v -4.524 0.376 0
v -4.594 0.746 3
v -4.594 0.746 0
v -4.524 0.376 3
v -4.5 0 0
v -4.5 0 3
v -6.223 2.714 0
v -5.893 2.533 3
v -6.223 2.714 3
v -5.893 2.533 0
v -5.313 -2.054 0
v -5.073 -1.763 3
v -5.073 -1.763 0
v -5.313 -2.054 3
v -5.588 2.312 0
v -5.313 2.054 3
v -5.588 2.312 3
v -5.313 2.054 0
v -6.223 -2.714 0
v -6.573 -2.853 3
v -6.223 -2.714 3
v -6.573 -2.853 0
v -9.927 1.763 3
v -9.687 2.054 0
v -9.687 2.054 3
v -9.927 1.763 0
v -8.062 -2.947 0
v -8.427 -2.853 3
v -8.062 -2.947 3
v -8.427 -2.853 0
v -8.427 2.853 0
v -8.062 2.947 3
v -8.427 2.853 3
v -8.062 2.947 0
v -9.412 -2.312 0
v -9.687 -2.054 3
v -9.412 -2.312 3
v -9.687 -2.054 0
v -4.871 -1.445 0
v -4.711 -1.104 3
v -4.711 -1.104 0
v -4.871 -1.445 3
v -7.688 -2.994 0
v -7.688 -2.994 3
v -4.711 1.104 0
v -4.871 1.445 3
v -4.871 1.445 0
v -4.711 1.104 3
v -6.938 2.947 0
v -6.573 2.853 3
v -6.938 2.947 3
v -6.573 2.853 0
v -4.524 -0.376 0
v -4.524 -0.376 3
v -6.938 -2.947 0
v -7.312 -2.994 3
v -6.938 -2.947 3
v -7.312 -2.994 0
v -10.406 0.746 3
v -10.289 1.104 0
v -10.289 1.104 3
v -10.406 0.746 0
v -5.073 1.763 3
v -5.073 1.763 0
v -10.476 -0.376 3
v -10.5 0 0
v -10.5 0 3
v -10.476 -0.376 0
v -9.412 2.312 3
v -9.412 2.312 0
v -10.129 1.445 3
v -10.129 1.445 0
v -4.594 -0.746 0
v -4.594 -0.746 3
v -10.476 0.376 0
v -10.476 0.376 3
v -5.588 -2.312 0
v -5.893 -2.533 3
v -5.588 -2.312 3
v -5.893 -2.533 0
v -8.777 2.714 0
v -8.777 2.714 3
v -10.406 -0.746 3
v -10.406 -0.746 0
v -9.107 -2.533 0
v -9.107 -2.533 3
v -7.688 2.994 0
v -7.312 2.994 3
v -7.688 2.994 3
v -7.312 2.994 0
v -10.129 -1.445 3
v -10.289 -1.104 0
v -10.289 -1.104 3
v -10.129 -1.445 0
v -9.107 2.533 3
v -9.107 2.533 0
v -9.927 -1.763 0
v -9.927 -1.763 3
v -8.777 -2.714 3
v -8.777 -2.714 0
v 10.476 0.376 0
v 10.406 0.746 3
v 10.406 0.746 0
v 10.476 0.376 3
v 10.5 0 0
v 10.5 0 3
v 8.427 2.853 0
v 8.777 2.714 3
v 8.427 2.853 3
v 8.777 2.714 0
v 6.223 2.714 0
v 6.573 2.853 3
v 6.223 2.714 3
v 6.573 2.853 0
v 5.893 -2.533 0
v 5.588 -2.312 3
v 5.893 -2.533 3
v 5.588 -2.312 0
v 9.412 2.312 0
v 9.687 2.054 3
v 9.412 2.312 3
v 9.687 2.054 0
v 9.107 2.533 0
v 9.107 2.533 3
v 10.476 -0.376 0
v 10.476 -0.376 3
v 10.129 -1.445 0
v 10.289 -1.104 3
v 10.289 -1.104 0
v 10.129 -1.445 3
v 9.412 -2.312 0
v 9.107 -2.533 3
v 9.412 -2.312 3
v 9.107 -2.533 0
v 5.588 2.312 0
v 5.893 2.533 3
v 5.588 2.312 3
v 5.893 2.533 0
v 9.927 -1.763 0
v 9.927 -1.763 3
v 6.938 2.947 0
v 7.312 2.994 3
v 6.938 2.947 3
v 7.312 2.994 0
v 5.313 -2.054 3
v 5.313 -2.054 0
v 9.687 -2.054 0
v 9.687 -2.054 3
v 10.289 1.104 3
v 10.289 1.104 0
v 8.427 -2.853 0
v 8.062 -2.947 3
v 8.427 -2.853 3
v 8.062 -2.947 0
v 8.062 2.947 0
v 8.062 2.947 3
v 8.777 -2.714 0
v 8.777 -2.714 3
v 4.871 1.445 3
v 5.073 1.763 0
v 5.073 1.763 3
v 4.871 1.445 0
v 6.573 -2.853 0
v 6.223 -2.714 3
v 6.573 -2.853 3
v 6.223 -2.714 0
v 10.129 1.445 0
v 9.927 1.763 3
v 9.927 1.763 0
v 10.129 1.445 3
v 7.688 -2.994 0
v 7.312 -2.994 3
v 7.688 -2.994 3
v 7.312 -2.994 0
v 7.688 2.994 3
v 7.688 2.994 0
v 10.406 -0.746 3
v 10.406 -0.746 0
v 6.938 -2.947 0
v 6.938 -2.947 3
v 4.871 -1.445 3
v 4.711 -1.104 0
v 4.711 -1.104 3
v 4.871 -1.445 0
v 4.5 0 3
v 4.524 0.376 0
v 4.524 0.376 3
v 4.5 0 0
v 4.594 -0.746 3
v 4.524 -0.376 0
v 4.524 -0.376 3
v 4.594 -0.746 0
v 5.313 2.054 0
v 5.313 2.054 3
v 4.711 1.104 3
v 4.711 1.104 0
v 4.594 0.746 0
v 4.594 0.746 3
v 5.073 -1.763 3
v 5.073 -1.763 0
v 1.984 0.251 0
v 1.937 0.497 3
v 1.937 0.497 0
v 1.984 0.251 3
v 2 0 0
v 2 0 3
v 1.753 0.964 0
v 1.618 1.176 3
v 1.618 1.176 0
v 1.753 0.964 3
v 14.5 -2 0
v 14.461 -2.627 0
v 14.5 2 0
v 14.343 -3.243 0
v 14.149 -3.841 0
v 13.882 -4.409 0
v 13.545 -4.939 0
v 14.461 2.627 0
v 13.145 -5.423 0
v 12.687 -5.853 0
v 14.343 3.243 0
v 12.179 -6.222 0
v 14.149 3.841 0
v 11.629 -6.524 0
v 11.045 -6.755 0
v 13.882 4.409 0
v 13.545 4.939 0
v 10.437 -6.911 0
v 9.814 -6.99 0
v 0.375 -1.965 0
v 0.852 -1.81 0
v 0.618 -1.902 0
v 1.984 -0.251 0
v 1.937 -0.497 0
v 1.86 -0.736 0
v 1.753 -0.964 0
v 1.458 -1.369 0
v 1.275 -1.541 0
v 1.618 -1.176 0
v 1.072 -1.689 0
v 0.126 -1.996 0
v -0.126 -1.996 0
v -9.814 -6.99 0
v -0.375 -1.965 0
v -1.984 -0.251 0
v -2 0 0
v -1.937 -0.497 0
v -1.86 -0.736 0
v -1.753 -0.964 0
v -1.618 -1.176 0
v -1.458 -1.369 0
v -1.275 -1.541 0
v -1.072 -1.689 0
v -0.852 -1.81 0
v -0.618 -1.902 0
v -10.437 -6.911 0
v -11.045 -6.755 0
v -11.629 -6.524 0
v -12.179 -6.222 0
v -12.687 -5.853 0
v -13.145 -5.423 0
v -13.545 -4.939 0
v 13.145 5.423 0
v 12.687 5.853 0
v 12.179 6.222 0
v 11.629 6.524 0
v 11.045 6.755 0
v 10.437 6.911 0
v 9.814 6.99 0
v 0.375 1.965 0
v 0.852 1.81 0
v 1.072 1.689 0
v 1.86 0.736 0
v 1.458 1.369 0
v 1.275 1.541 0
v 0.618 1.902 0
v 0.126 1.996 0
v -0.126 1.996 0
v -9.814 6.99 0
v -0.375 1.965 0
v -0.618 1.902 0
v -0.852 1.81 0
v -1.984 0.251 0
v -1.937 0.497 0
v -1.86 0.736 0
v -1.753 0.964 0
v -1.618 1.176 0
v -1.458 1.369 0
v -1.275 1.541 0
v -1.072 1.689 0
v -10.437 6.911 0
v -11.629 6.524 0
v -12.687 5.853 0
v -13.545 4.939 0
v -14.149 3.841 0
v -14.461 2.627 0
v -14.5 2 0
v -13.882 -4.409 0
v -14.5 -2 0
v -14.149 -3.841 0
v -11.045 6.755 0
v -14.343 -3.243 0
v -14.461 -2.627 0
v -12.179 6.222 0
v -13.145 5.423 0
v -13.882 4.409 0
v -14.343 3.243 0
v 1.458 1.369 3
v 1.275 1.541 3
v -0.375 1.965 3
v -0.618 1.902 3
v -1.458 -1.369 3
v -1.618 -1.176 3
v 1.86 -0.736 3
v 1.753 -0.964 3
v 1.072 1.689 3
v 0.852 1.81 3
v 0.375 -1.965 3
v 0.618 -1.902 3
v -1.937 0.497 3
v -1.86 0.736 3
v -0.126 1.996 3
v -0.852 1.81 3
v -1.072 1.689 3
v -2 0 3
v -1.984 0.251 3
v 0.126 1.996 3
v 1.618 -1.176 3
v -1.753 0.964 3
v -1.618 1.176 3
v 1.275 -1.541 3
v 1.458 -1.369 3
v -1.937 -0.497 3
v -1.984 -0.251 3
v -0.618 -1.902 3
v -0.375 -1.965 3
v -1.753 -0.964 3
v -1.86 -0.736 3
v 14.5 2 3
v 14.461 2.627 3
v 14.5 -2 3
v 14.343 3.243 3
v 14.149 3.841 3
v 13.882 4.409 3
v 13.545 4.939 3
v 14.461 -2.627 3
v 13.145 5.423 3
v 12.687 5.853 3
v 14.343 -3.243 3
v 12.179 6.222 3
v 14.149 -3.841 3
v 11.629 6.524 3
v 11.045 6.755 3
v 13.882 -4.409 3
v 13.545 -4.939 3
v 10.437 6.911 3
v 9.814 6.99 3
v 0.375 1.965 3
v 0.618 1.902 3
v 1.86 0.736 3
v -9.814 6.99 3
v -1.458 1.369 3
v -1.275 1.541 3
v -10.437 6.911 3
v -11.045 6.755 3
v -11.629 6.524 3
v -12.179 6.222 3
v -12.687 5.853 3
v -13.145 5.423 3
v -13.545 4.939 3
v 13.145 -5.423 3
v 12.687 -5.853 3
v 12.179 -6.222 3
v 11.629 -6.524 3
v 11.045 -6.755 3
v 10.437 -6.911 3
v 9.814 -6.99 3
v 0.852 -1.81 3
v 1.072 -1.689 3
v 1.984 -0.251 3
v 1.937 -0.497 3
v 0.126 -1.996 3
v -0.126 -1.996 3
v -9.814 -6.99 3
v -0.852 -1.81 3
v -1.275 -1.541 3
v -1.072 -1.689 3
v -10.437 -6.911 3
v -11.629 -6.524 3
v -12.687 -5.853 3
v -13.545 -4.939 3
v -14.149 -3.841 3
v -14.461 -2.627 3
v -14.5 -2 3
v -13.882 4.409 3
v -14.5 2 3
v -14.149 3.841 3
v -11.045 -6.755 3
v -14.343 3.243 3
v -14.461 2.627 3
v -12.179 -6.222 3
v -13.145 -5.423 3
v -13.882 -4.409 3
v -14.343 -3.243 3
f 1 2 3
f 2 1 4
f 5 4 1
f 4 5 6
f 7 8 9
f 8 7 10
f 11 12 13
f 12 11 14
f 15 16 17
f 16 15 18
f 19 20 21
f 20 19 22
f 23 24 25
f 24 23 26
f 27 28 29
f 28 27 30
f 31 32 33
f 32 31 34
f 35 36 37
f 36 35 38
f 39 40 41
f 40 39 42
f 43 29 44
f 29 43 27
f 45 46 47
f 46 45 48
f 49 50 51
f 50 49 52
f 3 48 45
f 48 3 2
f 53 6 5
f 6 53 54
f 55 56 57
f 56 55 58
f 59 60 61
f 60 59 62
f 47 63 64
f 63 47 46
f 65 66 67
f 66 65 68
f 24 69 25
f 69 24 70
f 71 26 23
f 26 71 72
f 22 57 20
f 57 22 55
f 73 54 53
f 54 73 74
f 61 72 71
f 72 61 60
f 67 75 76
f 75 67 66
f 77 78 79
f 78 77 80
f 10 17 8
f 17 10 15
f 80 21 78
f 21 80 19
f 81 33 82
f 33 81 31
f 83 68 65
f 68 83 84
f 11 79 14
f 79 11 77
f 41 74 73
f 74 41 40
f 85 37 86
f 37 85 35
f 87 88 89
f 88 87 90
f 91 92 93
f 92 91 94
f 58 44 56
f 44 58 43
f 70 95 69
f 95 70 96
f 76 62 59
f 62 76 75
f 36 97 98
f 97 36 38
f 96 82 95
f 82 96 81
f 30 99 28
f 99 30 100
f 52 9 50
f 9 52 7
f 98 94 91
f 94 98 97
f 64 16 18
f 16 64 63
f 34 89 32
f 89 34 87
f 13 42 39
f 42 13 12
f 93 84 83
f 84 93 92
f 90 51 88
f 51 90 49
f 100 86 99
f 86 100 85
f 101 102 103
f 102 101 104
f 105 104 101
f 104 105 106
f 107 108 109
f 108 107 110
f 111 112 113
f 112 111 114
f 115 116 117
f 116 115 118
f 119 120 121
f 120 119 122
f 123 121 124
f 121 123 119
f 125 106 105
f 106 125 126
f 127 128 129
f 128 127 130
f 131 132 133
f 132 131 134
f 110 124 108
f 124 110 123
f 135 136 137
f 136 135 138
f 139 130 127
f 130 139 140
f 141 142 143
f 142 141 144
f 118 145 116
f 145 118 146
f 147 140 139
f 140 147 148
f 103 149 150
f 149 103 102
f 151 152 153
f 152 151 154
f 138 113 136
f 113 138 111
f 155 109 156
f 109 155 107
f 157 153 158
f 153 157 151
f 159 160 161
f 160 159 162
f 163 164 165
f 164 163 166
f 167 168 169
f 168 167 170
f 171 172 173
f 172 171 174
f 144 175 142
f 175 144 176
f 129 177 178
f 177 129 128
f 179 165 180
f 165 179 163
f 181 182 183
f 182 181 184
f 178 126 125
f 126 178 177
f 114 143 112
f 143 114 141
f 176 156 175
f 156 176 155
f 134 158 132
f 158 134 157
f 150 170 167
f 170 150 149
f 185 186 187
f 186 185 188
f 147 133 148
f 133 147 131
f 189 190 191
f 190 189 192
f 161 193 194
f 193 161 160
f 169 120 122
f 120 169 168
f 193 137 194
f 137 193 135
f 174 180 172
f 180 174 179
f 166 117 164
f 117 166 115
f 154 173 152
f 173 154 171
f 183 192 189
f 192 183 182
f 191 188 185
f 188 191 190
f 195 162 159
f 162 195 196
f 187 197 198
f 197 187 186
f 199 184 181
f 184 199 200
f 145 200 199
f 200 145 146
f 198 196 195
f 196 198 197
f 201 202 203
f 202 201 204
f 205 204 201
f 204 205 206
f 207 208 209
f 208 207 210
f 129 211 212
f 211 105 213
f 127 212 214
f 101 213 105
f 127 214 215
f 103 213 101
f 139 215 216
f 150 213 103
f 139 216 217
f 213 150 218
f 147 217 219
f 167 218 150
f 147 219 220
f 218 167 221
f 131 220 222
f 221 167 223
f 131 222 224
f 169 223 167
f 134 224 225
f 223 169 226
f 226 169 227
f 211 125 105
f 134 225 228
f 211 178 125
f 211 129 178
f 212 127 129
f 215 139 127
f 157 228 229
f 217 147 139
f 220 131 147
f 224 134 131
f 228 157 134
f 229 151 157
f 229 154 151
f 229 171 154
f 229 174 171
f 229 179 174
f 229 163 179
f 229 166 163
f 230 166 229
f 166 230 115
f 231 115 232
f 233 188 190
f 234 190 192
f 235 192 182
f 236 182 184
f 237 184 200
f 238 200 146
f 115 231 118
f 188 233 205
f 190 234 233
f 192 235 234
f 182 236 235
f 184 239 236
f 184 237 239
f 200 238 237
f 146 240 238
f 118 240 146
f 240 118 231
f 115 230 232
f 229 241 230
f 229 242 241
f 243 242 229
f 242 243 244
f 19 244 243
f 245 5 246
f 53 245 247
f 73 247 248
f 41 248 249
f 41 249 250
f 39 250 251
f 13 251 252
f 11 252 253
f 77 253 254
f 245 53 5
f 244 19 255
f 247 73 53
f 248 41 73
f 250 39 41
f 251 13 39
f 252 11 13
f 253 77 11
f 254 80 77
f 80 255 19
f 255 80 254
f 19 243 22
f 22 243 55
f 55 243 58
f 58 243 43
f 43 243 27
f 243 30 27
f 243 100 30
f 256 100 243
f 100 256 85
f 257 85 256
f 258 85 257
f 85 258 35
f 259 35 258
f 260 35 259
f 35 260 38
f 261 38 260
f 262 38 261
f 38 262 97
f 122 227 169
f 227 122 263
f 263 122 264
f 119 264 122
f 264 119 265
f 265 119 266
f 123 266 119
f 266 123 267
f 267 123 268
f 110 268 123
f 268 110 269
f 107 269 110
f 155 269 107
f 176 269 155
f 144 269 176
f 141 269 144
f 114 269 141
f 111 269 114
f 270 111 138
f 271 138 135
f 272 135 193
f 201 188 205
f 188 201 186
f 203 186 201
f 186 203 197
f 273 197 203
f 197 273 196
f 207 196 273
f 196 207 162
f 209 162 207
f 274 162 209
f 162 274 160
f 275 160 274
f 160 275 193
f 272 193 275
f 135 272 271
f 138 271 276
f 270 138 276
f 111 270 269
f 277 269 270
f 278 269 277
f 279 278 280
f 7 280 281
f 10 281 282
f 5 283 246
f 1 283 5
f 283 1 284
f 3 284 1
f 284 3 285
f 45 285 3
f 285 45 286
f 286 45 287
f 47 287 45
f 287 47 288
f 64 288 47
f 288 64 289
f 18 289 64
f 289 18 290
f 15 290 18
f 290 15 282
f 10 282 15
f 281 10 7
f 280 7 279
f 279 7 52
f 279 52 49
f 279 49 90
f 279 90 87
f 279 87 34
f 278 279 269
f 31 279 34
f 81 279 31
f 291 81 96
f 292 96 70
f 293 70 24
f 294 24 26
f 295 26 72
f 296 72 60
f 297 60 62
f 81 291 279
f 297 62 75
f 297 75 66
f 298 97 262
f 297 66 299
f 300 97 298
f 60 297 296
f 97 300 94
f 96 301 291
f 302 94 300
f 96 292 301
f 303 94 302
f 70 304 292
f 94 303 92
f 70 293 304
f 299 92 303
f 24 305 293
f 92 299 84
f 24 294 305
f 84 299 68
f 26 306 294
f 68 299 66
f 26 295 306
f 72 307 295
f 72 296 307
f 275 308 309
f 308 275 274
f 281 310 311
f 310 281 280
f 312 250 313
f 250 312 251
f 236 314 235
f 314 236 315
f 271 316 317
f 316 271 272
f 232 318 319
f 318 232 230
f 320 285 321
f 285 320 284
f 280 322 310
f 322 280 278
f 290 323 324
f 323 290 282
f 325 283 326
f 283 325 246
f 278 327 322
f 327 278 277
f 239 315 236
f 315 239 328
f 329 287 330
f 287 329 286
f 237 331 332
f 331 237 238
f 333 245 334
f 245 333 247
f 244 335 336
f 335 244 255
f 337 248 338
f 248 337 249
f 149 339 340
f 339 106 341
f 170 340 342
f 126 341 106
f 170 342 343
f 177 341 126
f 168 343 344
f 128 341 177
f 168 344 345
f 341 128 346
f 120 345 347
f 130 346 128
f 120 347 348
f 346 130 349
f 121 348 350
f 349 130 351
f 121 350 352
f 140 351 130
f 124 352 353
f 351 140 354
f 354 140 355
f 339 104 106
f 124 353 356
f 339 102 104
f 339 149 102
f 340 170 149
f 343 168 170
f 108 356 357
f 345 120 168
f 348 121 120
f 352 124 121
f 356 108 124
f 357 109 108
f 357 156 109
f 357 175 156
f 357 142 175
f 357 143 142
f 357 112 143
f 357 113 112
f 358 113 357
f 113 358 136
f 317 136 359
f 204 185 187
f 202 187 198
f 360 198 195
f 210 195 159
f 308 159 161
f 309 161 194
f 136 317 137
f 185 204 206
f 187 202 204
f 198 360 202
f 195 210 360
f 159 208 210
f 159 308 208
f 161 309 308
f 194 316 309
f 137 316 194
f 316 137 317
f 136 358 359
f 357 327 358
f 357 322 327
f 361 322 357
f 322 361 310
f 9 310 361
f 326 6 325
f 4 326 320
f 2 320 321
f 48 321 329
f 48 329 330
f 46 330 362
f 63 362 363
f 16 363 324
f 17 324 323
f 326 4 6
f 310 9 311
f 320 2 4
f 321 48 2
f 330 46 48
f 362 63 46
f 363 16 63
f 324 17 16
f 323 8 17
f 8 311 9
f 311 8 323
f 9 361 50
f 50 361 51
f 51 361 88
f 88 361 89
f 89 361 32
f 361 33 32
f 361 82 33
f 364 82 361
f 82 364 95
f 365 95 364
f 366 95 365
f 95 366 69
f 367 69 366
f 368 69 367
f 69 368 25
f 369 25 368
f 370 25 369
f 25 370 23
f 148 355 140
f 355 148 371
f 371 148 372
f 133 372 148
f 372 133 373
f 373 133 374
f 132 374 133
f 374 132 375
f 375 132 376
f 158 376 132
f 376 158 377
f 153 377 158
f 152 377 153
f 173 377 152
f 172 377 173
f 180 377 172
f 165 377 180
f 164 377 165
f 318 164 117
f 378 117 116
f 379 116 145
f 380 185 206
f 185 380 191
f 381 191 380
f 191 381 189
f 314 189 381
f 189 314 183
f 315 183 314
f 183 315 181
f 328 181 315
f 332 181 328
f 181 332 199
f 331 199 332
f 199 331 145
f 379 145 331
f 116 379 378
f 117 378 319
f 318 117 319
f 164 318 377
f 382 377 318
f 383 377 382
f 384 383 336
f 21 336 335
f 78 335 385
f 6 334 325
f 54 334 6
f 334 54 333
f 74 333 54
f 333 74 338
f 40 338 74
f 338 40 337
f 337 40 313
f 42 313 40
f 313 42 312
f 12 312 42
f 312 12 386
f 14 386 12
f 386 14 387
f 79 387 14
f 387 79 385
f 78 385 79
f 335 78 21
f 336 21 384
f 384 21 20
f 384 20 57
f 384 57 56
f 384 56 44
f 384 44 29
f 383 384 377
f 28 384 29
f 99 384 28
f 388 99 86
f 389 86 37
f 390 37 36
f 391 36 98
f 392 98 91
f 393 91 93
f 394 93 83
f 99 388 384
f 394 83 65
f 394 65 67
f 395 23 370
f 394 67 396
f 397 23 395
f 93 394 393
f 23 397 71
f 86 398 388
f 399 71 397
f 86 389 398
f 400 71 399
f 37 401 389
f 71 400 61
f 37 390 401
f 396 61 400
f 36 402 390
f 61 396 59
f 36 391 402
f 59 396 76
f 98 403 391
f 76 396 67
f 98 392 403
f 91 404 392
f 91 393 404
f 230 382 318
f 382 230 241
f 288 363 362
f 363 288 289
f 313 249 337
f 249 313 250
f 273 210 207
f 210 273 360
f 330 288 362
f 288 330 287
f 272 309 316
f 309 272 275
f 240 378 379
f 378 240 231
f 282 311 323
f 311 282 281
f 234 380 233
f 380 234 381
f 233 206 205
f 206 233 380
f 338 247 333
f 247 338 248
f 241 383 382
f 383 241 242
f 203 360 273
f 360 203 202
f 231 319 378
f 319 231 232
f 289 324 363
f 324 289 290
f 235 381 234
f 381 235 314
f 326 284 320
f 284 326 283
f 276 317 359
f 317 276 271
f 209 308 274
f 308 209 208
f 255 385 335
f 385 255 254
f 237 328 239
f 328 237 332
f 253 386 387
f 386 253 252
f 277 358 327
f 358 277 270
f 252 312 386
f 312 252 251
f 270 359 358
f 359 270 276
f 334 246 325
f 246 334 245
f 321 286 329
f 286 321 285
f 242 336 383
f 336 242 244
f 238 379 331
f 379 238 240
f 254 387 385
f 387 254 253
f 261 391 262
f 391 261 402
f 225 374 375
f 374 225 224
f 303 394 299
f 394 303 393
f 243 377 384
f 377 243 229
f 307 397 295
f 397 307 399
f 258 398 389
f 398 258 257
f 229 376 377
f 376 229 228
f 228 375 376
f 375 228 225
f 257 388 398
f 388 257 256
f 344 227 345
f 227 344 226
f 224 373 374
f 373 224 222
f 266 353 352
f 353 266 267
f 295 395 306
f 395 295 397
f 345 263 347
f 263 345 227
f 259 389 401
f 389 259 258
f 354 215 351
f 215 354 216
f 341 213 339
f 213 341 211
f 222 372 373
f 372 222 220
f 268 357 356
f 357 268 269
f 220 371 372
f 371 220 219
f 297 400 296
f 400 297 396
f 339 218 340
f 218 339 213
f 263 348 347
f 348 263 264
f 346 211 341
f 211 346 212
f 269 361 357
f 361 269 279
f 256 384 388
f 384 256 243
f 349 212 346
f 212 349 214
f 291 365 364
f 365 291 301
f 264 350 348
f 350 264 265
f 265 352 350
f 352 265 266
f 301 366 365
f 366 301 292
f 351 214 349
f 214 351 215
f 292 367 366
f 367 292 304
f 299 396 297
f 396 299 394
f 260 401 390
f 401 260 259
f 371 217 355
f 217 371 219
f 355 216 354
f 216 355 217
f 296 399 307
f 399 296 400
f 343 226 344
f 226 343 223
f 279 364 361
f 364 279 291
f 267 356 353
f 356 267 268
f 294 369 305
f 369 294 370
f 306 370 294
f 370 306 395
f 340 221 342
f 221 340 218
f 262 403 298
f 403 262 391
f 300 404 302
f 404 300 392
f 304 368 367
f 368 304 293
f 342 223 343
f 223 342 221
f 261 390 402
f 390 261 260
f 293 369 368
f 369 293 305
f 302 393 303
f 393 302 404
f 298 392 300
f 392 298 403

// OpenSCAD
$fn = 50;


difference() {
	union() {
		hull() {
			translate(v = [-9.5000000000, 2.0000000000, 0]) {
				cylinder(h = 3, r = 5);
			}
			translate(v = [9.5000000000, 2.0000000000, 0]) {
				cylinder(h = 3, r = 5);
			}
			translate(v = [-9.5000000000, -2.0000000000, 0]) {
				cylinder(h = 3, r = 5);
			}
			translate(v = [9.5000000000, -2.0000000000, 0]) {
				cylinder(h = 3, r = 5);
			}
		}
	}
	union() {
		#translate(v = [-7.5000000000, 0.0000000000, 0]) {
			cylinder(h = 3, r = 3.0000000000);
		}
		#translate(v = [7.5000000000, 0.0000000000, 0]) {
			cylinder(h = 3, r = 3.0000000000);
		}
		#translate(v = [-7.5000000000, 0.0000000000, -100.0000000000]) {
			cylinder(h = 200, r = 3.0000000000);
		}
		#translate(v = [-7.5000000000, 0.0000000000, -100.0000000000]) {
			cylinder(h = 200, r = 3.0000000000);
		}
		#translate(v = [7.5000000000, 0.0000000000, -100.0000000000]) {
			cylinder(h = 200, r = 3.0000000000);
		}
		#translate(v = [7.5000000000, 0.0000000000, -100.0000000000]) {
			cylinder(h = 200, r = 3.0000000000);
		}
		#translate(v = [-7.5000000000, 0.0000000000, 0]) {
			cylinder(h = 3, r = 1.5000000000);
		}
		#translate(v = [7.5000000000, 0.0000000000, 0]) {
			cylinder(h = 3, r = 1.5000000000);
		}
		#translate(v = [-7.5000000000, 0.0000000000, 0]) {
			cylinder(h = 3, r = 1.5000000000);
		}
		#translate(v = [7.5000000000, 0.0000000000, 0]) {
			cylinder(h = 3, r = 1.5000000000);
		}
		#translate(v = [-7.5000000000, 0.0000000000, 0]) {
			cylinder(h = 3, r = 1.5000000000);
		}
		#translate(v = [7.5000000000, 0.0000000000, 0]) {
			cylinder(h = 3, r = 1.5000000000);
		}
		#cylinder(h = 3, r = 2.0000000000);
	}
}
